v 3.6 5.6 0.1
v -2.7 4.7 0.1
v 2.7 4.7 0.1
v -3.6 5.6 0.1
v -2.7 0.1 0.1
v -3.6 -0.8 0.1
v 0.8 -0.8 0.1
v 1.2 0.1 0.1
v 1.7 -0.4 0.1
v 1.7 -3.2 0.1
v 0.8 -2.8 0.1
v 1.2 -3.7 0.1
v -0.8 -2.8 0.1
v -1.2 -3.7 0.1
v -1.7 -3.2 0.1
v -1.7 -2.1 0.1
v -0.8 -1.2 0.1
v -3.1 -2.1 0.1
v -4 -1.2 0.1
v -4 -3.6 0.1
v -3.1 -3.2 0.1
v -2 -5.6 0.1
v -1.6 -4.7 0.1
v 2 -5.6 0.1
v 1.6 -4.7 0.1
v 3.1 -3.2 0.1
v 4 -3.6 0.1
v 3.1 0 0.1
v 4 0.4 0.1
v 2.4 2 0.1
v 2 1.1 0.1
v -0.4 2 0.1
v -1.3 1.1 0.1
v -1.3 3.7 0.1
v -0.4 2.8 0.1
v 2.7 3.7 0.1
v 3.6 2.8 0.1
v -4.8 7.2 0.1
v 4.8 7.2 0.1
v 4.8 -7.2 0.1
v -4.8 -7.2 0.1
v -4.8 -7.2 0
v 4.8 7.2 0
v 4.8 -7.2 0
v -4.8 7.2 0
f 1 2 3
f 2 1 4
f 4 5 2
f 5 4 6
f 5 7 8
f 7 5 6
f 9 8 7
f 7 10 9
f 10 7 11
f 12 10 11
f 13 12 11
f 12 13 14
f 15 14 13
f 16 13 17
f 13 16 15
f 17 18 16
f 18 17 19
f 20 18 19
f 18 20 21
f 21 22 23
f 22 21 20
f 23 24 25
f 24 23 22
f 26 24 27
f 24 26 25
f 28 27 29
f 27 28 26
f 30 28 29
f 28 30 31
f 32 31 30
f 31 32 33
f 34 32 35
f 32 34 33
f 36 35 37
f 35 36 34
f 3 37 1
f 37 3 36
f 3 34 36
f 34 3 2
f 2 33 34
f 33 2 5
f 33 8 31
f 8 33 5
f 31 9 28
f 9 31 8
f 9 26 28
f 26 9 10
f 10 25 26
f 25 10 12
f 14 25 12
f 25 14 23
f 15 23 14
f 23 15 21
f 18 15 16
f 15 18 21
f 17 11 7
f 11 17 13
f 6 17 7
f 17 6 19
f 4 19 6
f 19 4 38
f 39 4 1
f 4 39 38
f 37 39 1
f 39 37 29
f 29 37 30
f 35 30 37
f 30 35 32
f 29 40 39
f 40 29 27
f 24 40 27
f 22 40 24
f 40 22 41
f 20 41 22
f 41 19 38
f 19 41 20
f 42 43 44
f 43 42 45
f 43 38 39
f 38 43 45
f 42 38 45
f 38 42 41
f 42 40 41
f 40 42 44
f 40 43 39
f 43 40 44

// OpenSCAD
// file: ../p/4-4edge.scad
use <../lib.scad>
$fa=1; $fs=0.2;
function ldraw_lib__4_4edge(realsolid=false) = [
// 0 Circle 1.0
// 0 Name: 4-4edge.dat
// 0 Author: James Jessiman
// 0 !LDRAW_ORG Primitive UPDATE 2017-01
// 0 !LICENSE Licensed under CC BY 2.0 and CC BY 4.0 : see CAreadme.txt
// 
// 0 BFC CERTIFY CCW
  [0,"BFC","CERTIFY"],
  [0,"BFC","CCW"],
// 
// 0 !HISTORY 1998-12-15 [PTadmin] Official Update 1998-10
// 0 !HISTORY 2005-12-28 [PTadmin] Official Update 2005-01
// 0 !HISTORY 2007-06-24 [PTadmin] Header formatted for Contributor Agreement
// 0 !HISTORY 2008-07-01 [PTadmin] Official Update 2008-01
// 0 !HISTORY 2017-01-15 [Steffen] BFCed
// 0 !HISTORY 2017-12-30 [PTadmin] Official Update 2017-01
// 
// 
// 2 24 1 0 0 0.9239 0 0.3827
  [2,24,1,0,0,0.9239,0,0.3827],
// 2 24 0.9239 0 0.3827 0.7071 0 0.7071
  [2,24,0.9239,0,0.3827,0.7071,0,0.7071],
// 2 24 0.7071 0 0.7071 0.3827 0 0.9239
  [2,24,0.7071,0,0.7071,0.3827,0,0.9239],
// 2 24 0.3827 0 0.9239 0 0 1
  [2,24,0.3827,0,0.9239,0,0,1],
// 2 24 0 0 1 -0.3827 0 0.9239
  [2,24,0,0,1,-0.3827,0,0.9239],
// 2 24 -0.3827 0 0.9239 -0.7071 0 0.7071
  [2,24,-0.3827,0,0.9239,-0.7071,0,0.7071],
// 2 24 -0.7071 0 0.7071 -0.9239 0 0.3827
  [2,24,-0.7071,0,0.7071,-0.9239,0,0.3827],
// 2 24 -0.9239 0 0.3827 -1 0 -0
  [2,24,-0.9239,0,0.3827,-1,0,-0],
// 2 24 -1 0 -0 -0.9239 0 -0.3827
  [2,24,-1,0,-0,-0.9239,0,-0.3827],
// 2 24 -0.9239 0 -0.3827 -0.7071 0 -0.7071
  [2,24,-0.9239,0,-0.3827,-0.7071,0,-0.7071],
// 2 24 -0.7071 0 -0.7071 -0.3827 0 -0.9239
  [2,24,-0.7071,0,-0.7071,-0.3827,0,-0.9239],
// 2 24 -0.3827 0 -0.9239 0 0 -1
  [2,24,-0.3827,0,-0.9239,0,0,-1],
// 2 24 0 0 -1 0.3827 0 -0.9239
  [2,24,0,0,-1,0.3827,0,-0.9239],
// 2 24 0.3827 0 -0.9239 0.7071 0 -0.7071
  [2,24,0.3827,0,-0.9239,0.7071,0,-0.7071],
// 2 24 0.7071 0 -0.7071 0.9239 0 -0.3827
  [2,24,0.7071,0,-0.7071,0.9239,0,-0.3827],
// 2 24 0.9239 0 -0.3827 1 0 0
  [2,24,0.9239,0,-0.3827,1,0,0],
];
module ldraw_lib__4_4edge(step=0, col=false, unit=2/5, alt=false, line=0.2, solid=!$preview)
    makepoly(ldraw_lib__4_4edge(solid), step=step, col=col, unit=unit, alt=alt, line=line, solid=solid);
ldraw_lib__4_4edge(line=0.2);
// file: ../p/4-4disc.scad
use <../lib.scad>
$fa=1; $fs=0.2;
function ldraw_lib__4_4disc(realsolid=false) = [
// 0 Disc 1.0
// 0 Name: 4-4disc.dat
// 0 Author: James Jessiman
// 0 !LDRAW_ORG Primitive UPDATE 2002-02
// 0 !LICENSE Licensed under CC BY 2.0 and CC BY 4.0 : see CAreadme.txt
// 
// 0 BFC CERTIFY CCW
  [0,"BFC","CERTIFY"],
  [0,"BFC","CCW"],
// 
// 0 !HISTORY 1998-12-15 [PTadmin] Official Update 1998-10
// 0 !HISTORY 2002-03-23 [sbliss] Added BFC statement
// 0 !HISTORY 2002-04-25 [PTadmin] Official Update 2002-02
// 0 !HISTORY 2007-06-24 [PTadmin] Header formatted for Contributor Agreement
// 0 !HISTORY 2008-07-01 [PTadmin] Official Update 2008-01
// 
// 
// 3 16 0 0 0 1 0 0 0.9239 0 0.3827
  [3,16,0,0,0,1,0,0,0.9239,0,0.3827],
// 3 16 0 0 0 0.9239 0 0.3827 0.7071 0 0.7071
  [3,16,0,0,0,0.9239,0,0.3827,0.7071,0,0.7071],
// 3 16 0 0 0 0.7071 0 0.7071 0.3827 0 0.9239
  [3,16,0,0,0,0.7071,0,0.7071,0.3827,0,0.9239],
// 3 16 0 0 0 0.3827 0 0.9239 0 0 1
  [3,16,0,0,0,0.3827,0,0.9239,0,0,1],
// 3 16 0 0 0 0 0 1 -0.3827 0 0.9239
  [3,16,0,0,0,0,0,1,-0.3827,0,0.9239],
// 3 16 0 0 0 -0.3827 0 0.9239 -0.7071 0 0.7071
  [3,16,0,0,0,-0.3827,0,0.9239,-0.7071,0,0.7071],
// 3 16 0 0 0 -0.7071 0 0.7071 -0.9239 0 0.3827
  [3,16,0,0,0,-0.7071,0,0.7071,-0.9239,0,0.3827],
// 3 16 0 0 0 -0.9239 0 0.3827 -1 0 -0
  [3,16,0,0,0,-0.9239,0,0.3827,-1,0,-0],
// 3 16 0 0 0 -1 0 -0 -0.9239 0 -0.3827
  [3,16,0,0,0,-1,0,-0,-0.9239,0,-0.3827],
// 3 16 0 0 0 -0.9239 0 -0.3827 -0.7071 0 -0.7071
  [3,16,0,0,0,-0.9239,0,-0.3827,-0.7071,0,-0.7071],
// 3 16 0 0 0 -0.7071 0 -0.7071 -0.3827 0 -0.9239
  [3,16,0,0,0,-0.7071,0,-0.7071,-0.3827,0,-0.9239],
// 3 16 0 0 0 -0.3827 0 -0.9239 0 0 -1
  [3,16,0,0,0,-0.3827,0,-0.9239,0,0,-1],
// 3 16 0 0 0 0 0 -1 0.3827 0 -0.9239
  [3,16,0,0,0,0,0,-1,0.3827,0,-0.9239],
// 3 16 0 0 0 0.3827 0 -0.9239 0.7071 0 -0.7071
  [3,16,0,0,0,0.3827,0,-0.9239,0.7071,0,-0.7071],
// 3 16 0 0 0 0.7071 0 -0.7071 0.9239 0 -0.3827
  [3,16,0,0,0,0.7071,0,-0.7071,0.9239,0,-0.3827],
// 3 16 0 0 0 0.9239 0 -0.3827 1 0 0
  [3,16,0,0,0,0.9239,0,-0.3827,1,0,0],
// 0
];
module ldraw_lib__4_4disc(step=0, col=false, unit=2/5, alt=false, line=0.2, solid=!$preview)
    makepoly(ldraw_lib__4_4disc(solid), step=step, col=col, unit=unit, alt=alt, line=line, solid=solid);
ldraw_lib__4_4disc(line=0.2);
// file: ../p/4-4cyli.scad
use <../lib.scad>
$fa=1; $fs=0.2;
function ldraw_lib__4_4cyli(realsolid=false) = [
// 0 Cylinder 1.0
// 0 Name: 4-4cyli.dat
// 0 Author: James Jessiman
// 0 !LDRAW_ORG Primitive UPDATE 2005-01
// 0 !LICENSE Licensed under CC BY 2.0 and CC BY 4.0 : see CAreadme.txt
// 
// 0 BFC CERTIFY CCW
  [0,"BFC","CERTIFY"],
  [0,"BFC","CCW"],
// 
// 0 !HISTORY 1998-12-15 [PTadmin] Official Update 1998-10
// 0 !HISTORY 2002-03-23 [sbliss] Added BFC statement; merged headers from files in distributions LDraw 0.27 and Complete.
// 0 !HISTORY 2002-04-25 [PTadmin] Official Update 2002-02
// 0 !HISTORY 2004-12-14 [guyvivan] BFC CCW
// 0 !HISTORY 2005-12-28 [PTadmin] Official Update 2005-01
// 0 !HISTORY 2007-06-24 [PTadmin] Header formatted for Contributor Agreement
// 0 !HISTORY 2008-07-01 [PTadmin] Official Update 2008-01
// 
// 
// 4 16 1 1 0 0.9239 1 0.3827 0.9239 0 0.3827 1 0 0
  [4,16,1,1,0,0.9239,1,0.3827,0.9239,0,0.3827,1,0,0],
// 5 24 1 0 0 1 1 0 0.9239 0 0.3827 0.9239 0 -0.3827
  [5,24,1,0,0,1,1,0,0.9239,0,0.3827,0.9239,0,-0.3827],
// 4 16 0.9239 1 0.3827 0.7071 1 0.7071 0.7071 0 0.7071 0.9239 0 0.3827
  [4,16,0.9239,1,0.3827,0.7071,1,0.7071,0.7071,0,0.7071,0.9239,0,0.3827],
// 5 24 0.9239 0 0.3827 0.9239 1 0.3827 0.7071 0 0.7071 1 0 0
  [5,24,0.9239,0,0.3827,0.9239,1,0.3827,0.7071,0,0.7071,1,0,0],
// 4 16 0.7071 1 0.7071 0.3827 1 0.9239 0.3827 0 0.9239 0.7071 0 0.7071
  [4,16,0.7071,1,0.7071,0.3827,1,0.9239,0.3827,0,0.9239,0.7071,0,0.7071],
// 5 24 0.7071 0 0.7071 0.7071 1 0.7071 0.3827 0 0.9239 0.9239 0 0.3827
  [5,24,0.7071,0,0.7071,0.7071,1,0.7071,0.3827,0,0.9239,0.9239,0,0.3827],
// 4 16 0.3827 1 0.9239 0 1 1 0 0 1 0.3827 0 0.9239
  [4,16,0.3827,1,0.9239,0,1,1,0,0,1,0.3827,0,0.9239],
// 5 24 0.3827 0 0.9239 0.3827 1 0.9239 0 0 1 0.7071 0 0.7071
  [5,24,0.3827,0,0.9239,0.3827,1,0.9239,0,0,1,0.7071,0,0.7071],
// 4 16 0 1 1 -0.3827 1 0.9239 -0.3827 0 0.9239 0 0 1
  [4,16,0,1,1,-0.3827,1,0.9239,-0.3827,0,0.9239,0,0,1],
// 5 24 0 0 1 0 1 1 -0.3827 0 0.9239 0.3827 0 0.9239
  [5,24,0,0,1,0,1,1,-0.3827,0,0.9239,0.3827,0,0.9239],
// 4 16 -0.3827 1 0.9239 -0.7071 1 0.7071 -0.7071 0 0.7071 -0.3827 0 0.9239
  [4,16,-0.3827,1,0.9239,-0.7071,1,0.7071,-0.7071,0,0.7071,-0.3827,0,0.9239],
// 5 24 -0.3827 0 0.9239 -0.3827 1 0.9239 -0.7071 0 0.7071 0 0 1
  [5,24,-0.3827,0,0.9239,-0.3827,1,0.9239,-0.7071,0,0.7071,0,0,1],
// 4 16 -0.7071 1 0.7071 -0.9239 1 0.3827 -0.9239 0 0.3827 -0.7071 0 0.7071
  [4,16,-0.7071,1,0.7071,-0.9239,1,0.3827,-0.9239,0,0.3827,-0.7071,0,0.7071],
// 5 24 -0.7071 0 0.7071 -0.7071 1 0.7071 -0.9239 0 0.3827 -0.3827 0 0.9239
  [5,24,-0.7071,0,0.7071,-0.7071,1,0.7071,-0.9239,0,0.3827,-0.3827,0,0.9239],
// 4 16 -0.9239 1 0.3827 -1 1 0 -1 0 0 -0.9239 0 0.3827
  [4,16,-0.9239,1,0.3827,-1,1,0,-1,0,0,-0.9239,0,0.3827],
// 5 24 -0.9239 0 0.3827 -0.9239 1 0.3827 -1 0 0 -0.7071 0 0.7071
  [5,24,-0.9239,0,0.3827,-0.9239,1,0.3827,-1,0,0,-0.7071,0,0.7071],
// 4 16 -1 1 0 -0.9239 1 -0.3827 -0.9239 0 -0.3827 -1 0 0
  [4,16,-1,1,0,-0.9239,1,-0.3827,-0.9239,0,-0.3827,-1,0,0],
// 5 24 -1 0 0 -1 1 0 -0.9239 0 -0.3827 -0.9239 0 0.3827
  [5,24,-1,0,0,-1,1,0,-0.9239,0,-0.3827,-0.9239,0,0.3827],
// 4 16 -0.9239 1 -0.3827 -0.7071 1 -0.7071 -0.7071 0 -0.7071 -0.9239 0 -0.3827
  [4,16,-0.9239,1,-0.3827,-0.7071,1,-0.7071,-0.7071,0,-0.7071,-0.9239,0,-0.3827],
// 5 24 -0.9239 0 -0.3827 -0.9239 1 -0.3827 -0.7071 0 -0.7071 -1 0 0
  [5,24,-0.9239,0,-0.3827,-0.9239,1,-0.3827,-0.7071,0,-0.7071,-1,0,0],
// 4 16 -0.7071 1 -0.7071 -0.3827 1 -0.9239 -0.3827 0 -0.9239 -0.7071 0 -0.7071
  [4,16,-0.7071,1,-0.7071,-0.3827,1,-0.9239,-0.3827,0,-0.9239,-0.7071,0,-0.7071],
// 5 24 -0.7071 0 -0.7071 -0.7071 1 -0.7071 -0.3827 0 -0.9239 -0.9239 0 -0.3827
  [5,24,-0.7071,0,-0.7071,-0.7071,1,-0.7071,-0.3827,0,-0.9239,-0.9239,0,-0.3827],
// 4 16 -0.3827 1 -0.9239 0 1 -1 0 0 -1 -0.3827 0 -0.9239
  [4,16,-0.3827,1,-0.9239,0,1,-1,0,0,-1,-0.3827,0,-0.9239],
// 5 24 -0.3827 0 -0.9239 -0.3827 1 -0.9239 0 0 -1 -0.7071 0 -0.7071
  [5,24,-0.3827,0,-0.9239,-0.3827,1,-0.9239,0,0,-1,-0.7071,0,-0.7071],
// 4 16 0 1 -1 0.3827 1 -0.9239 0.3827 0 -0.9239 0 0 -1
  [4,16,0,1,-1,0.3827,1,-0.9239,0.3827,0,-0.9239,0,0,-1],
// 5 24 0 0 -1 0 1 -1 0.3827 0 -0.9239 -0.3827 0 -0.9239
  [5,24,0,0,-1,0,1,-1,0.3827,0,-0.9239,-0.3827,0,-0.9239],
// 4 16 0.3827 1 -0.9239 0.7071 1 -0.7071 0.7071 0 -0.7071 0.3827 0 -0.9239
  [4,16,0.3827,1,-0.9239,0.7071,1,-0.7071,0.7071,0,-0.7071,0.3827,0,-0.9239],
// 5 24 0.3827 0 -0.9239 0.3827 1 -0.9239 0.7071 0 -0.7071 0 0 -1
  [5,24,0.3827,0,-0.9239,0.3827,1,-0.9239,0.7071,0,-0.7071,0,0,-1],
// 4 16 0.7071 1 -0.7071 0.9239 1 -0.3827 0.9239 0 -0.3827 0.7071 0 -0.7071
  [4,16,0.7071,1,-0.7071,0.9239,1,-0.3827,0.9239,0,-0.3827,0.7071,0,-0.7071],
// 5 24 0.7071 0 -0.7071 0.7071 1 -0.7071 0.9239 0 -0.3827 0.3827 0 -0.9239
  [5,24,0.7071,0,-0.7071,0.7071,1,-0.7071,0.9239,0,-0.3827,0.3827,0,-0.9239],
// 4 16 0.9239 1 -0.3827 1 1 0 1 0 0 0.9239 0 -0.3827
  [4,16,0.9239,1,-0.3827,1,1,0,1,0,0,0.9239,0,-0.3827],
// 5 24 0.9239 0 -0.3827 0.9239 1 -0.3827 1 0 0 0.7071 0 -0.7071
  [5,24,0.9239,0,-0.3827,0.9239,1,-0.3827,1,0,0,0.7071,0,-0.7071],
// 0
];
module ldraw_lib__4_4cyli(step=0, col=false, unit=2/5, alt=false, line=0.2, solid=!$preview)
    makepoly(ldraw_lib__4_4cyli(solid), step=step, col=col, unit=unit, alt=alt, line=line, solid=solid);
ldraw_lib__4_4cyli(line=0.2);
// file: ../p/stud3.scad
use <../lib.scad>
use <4-4cyli.scad>
use <4-4disc.scad>
use <4-4edge.scad>
$fa=1; $fs=0.2;
function ldraw_lib__stud3(realsolid=false) = realsolid ? 
    [openscad(translate([0,0,-eps()], o=cylinder(4+eps(), r=4)),2)] : [
// 0 Stud Tube Solid
// 0 Name: stud3.dat
// 0 Author: James Jessiman
// 0 !LDRAW_ORG Primitive UPDATE 2012-01
// 0 !LICENSE Licensed under CC BY 2.0 and CC BY 4.0 : see CAreadme.txt
// 
// 0 BFC CERTIFY CCW
  [0,"BFC","CERTIFY"],
  [0,"BFC","CCW"],
// 
// 0 !HISTORY 2002-04-04 [sbliss] Modified for BFC compliance
// 0 !HISTORY 2002-04-25 [PTadmin] Official Update 2002-02
// 0 !HISTORY 2007-06-24 [PTadmin] Header formatted for Contributor Agreement
// 0 !HISTORY 2008-07-01 [PTadmin] Official Update 2008-01
// 0 !HISTORY 2012-02-16 [Philo] Changed to CCW
// 0 !HISTORY 2012-03-30 [PTadmin] Official Update 2012-01
// 
// 
// 1 16 0 -4 0 4 0 0 0 1 0 0 0 4 4-4edge.dat
  [1,16,0,-4,0,4,0,0,0,1,0,0,0,4, ldraw_lib__4_4edge(realsolid)],
// 1 16 0 0 0 4 0 0 0 1 0 0 0 4 4-4edge.dat
  [1,16,0,0,0,4,0,0,0,1,0,0,0,4, ldraw_lib__4_4edge(realsolid)],
// 1 16 0 -4 0 4 0 0 0 1 0 0 0 4 4-4disc.dat
  [1,16,0,-4,0,4,0,0,0,1,0,0,0,4, ldraw_lib__4_4disc(realsolid)],
// 1 16 0 -4 0 4 0 0 0 4 0 0 0 4 4-4cyli.dat
  [1,16,0,-4,0,4,0,0,0,4,0,0,0,4, ldraw_lib__4_4cyli(realsolid)],
];
module ldraw_lib__stud3(step=0, col=false, unit=2/5, alt=false, line=0.2, solid=!$preview)
    makepoly(ldraw_lib__stud3(solid), step=step, col=col, unit=unit, alt=alt, line=line, solid=solid);
ldraw_lib__stud3(line=0.2);
// file: ../p/stud.scad
use <../lib.scad>
use <4-4cyli.scad>
use <4-4disc.scad>
use <4-4edge.scad>
$fa=1; $fs=0.2;
function ldraw_lib__stud(realsolid=false) = realsolid ? 
    [openscad(translate([0,0,-eps()], o=cylinder(4+eps(), r=6)),2)] : [
// 0 Stud
// 0 Name: stud.dat
// 0 Author: James Jessiman
// 0 !LDRAW_ORG Primitive UPDATE 2012-01
// 0 !LICENSE Licensed under CC BY 2.0 and CC BY 4.0 : see CAreadme.txt
// 
// 0 BFC CERTIFY CCW
  [0,"BFC","CERTIFY"],
  [0,"BFC","CCW"],
// 
// 0 !HISTORY 2002-04-04 [sbliss] Modified for BFC compliance
// 0 !HISTORY 2002-04-25 [PTadmin] Official Update 2002-02
// 0 !HISTORY 2007-06-24 [PTadmin] Header formatted for Contributor Agreement
// 0 !HISTORY 2008-07-01 [PTadmin] Official Update 2008-01
// 0 !HISTORY 2012-02-16 [Philo] Changed to CCW
// 0 !HISTORY 2012-03-30 [PTadmin] Official Update 2012-01
// 
// 
// 1 16 0 0 0 6 0 0 0 1 0 0 0 6 4-4edge.dat
  [1,16,0,0,0,6,0,0,0,1,0,0,0,6, ldraw_lib__4_4edge(realsolid)],
// 1 16 0 -4 0 6 0 0 0 1 0 0 0 6 4-4edge.dat
  [1,16,0,-4,0,6,0,0,0,1,0,0,0,6, ldraw_lib__4_4edge(realsolid)],
// 1 16 0 0 0 6 0 0 0 -4 0 0 0 6 4-4cyli.dat
  [1,16,0,0,0,6,0,0,0,-4,0,0,0,6, ldraw_lib__4_4cyli(realsolid)],
// 1 16 0 -4 0 6 0 0 0 1 0 0 0 6 4-4disc.dat
  [1,16,0,-4,0,6,0,0,0,1,0,0,0,6, ldraw_lib__4_4disc(realsolid)],
];
module ldraw_lib__stud(step=0, col=false, unit=2/5, alt=false, line=0.2, solid=!$preview)
    makepoly(ldraw_lib__stud(solid), step=step, col=col, unit=unit, alt=alt, line=line, solid=solid);
ldraw_lib__stud(line=0.2);
// file: ../p/box5.scad
use <../lib.scad>
$fa=1; $fs=0.2;
function ldraw_lib__box5(realsolid=false) = [
// 0 Box with 5 Faces and All Edges
// 0 Name: box5.dat
// 0 Author: James Jessiman
// 0 !LDRAW_ORG Primitive UPDATE 2012-01
// 0 !LICENSE Licensed under CC BY 2.0 and CC BY 4.0 : see CAreadme.txt
// 
// 0 BFC CERTIFY CCW
  [0,"BFC","CERTIFY"],
  [0,"BFC","CCW"],
// 
// 0 !HISTORY 2002-04-03 [sbliss] Modified for BFC compliance
// 0 !HISTORY 2002-04-25 [PTadmin] Official Update 2002-02
// 0 !HISTORY 2007-06-24 [PTadmin] Header formatted for Contributor Agreement
// 0 !HISTORY 2008-07-01 [PTadmin] Official Update 2008-01
// 0 !HISTORY 2012-02-16 [Philo] Changed to CCW
// 0 !HISTORY 2012-03-30 [PTadmin] Official Update 2012-01
// 
// 
// 2 24 1 1 1 -1 1 1
  [2,24,1,1,1,-1,1,1],
// 2 24 -1 1 1 -1 1 -1
  [2,24,-1,1,1,-1,1,-1],
// 2 24 -1 1 -1 1 1 -1
  [2,24,-1,1,-1,1,1,-1],
// 2 24 1 1 -1 1 1 1
  [2,24,1,1,-1,1,1,1],
// 2 24 1 0 1 -1 0 1
  [2,24,1,0,1,-1,0,1],
// 2 24 -1 0 1 -1 0 -1
  [2,24,-1,0,1,-1,0,-1],
// 2 24 -1 0 -1 1 0 -1
  [2,24,-1,0,-1,1,0,-1],
// 2 24 1 0 -1 1 0 1
  [2,24,1,0,-1,1,0,1],
// 2 24 1 0 1 1 1 1
  [2,24,1,0,1,1,1,1],
// 2 24 -1 0 1 -1 1 1
  [2,24,-1,0,1,-1,1,1],
// 2 24 1 0 -1 1 1 -1
  [2,24,1,0,-1,1,1,-1],
// 2 24 -1 0 -1 -1 1 -1
  [2,24,-1,0,-1,-1,1,-1],
// 4 16 -1 1 1 1 1 1 1 1 -1 -1 1 -1
  [4,16,-1,1,1,1,1,1,1,1,-1,-1,1,-1],
// 4 16 -1 1 1 -1 0 1 1 0 1 1 1 1
  [4,16,-1,1,1,-1,0,1,1,0,1,1,1,1],
// 4 16 -1 1 -1 -1 0 -1 -1 0 1 -1 1 1
  [4,16,-1,1,-1,-1,0,-1,-1,0,1,-1,1,1],
// 4 16 1 1 -1 1 0 -1 -1 0 -1 -1 1 -1
  [4,16,1,1,-1,1,0,-1,-1,0,-1,-1,1,-1],
// 4 16 1 1 1 1 0 1 1 0 -1 1 1 -1
  [4,16,1,1,1,1,0,1,1,0,-1,1,1,-1],
];
module ldraw_lib__box5(step=0, col=false, unit=2/5, alt=false, line=0.2, solid=!$preview)
    makepoly(ldraw_lib__box5(solid), step=step, col=col, unit=unit, alt=alt, line=line, solid=solid);
ldraw_lib__box5(line=0.2);
// file: ../p/box4t.scad
use <../lib.scad>
$fa=1; $fs=0.2;
function ldraw_lib__box4t(realsolid=false) = [
// 0 Box with 4 Adjacent Faces and All Edges
// 0 Name: box4t.dat
// 0 Author: Tore Eriksson [Tore_Eriksson]
// 0 !LDRAW_ORG Primitive UPDATE 2003-02
// 0 !LICENSE Licensed under CC BY 2.0 and CC BY 4.0 : see CAreadme.txt
// 
// 0 BFC CERTIFY CCW
  [0,"BFC","CERTIFY"],
  [0,"BFC","CCW"],
// 
// 0 !HISTORY 1997-09-29 [PTadmin] Official Update 1997-15
// 0 !HISTORY 2002-08-31 [izanette] Modified with WINDZ for BFC compliance
// 0 !HISTORY 2003-08-01 [PTadmin] Official Update 2003-02
// 0 !HISTORY 2007-06-24 [PTadmin] Header formatted for Contributor Agreement
// 0 !HISTORY 2008-07-01 [PTadmin] Official Update 2008-01
// 
// 
// 2 24 1 1 1 -1 1 1
  [2,24,1,1,1,-1,1,1],
// 2 24 -1 1 1 -1 1 -1
  [2,24,-1,1,1,-1,1,-1],
// 2 24 -1 1 -1 1 1 -1
  [2,24,-1,1,-1,1,1,-1],
// 2 24 1 1 -1 1 1 1
  [2,24,1,1,-1,1,1,1],
// 2 24 1 0 1 -1 0 1
  [2,24,1,0,1,-1,0,1],
// 2 24 -1 0 1 -1 0 -1
  [2,24,-1,0,1,-1,0,-1],
// 2 24 -1 0 -1 1 0 -1
  [2,24,-1,0,-1,1,0,-1],
// 2 24 1 0 -1 1 0 1
  [2,24,1,0,-1,1,0,1],
// 2 24 1 0 1 1 1 1
  [2,24,1,0,1,1,1,1],
// 2 24 -1 0 1 -1 1 1
  [2,24,-1,0,1,-1,1,1],
// 2 24 1 0 -1 1 1 -1
  [2,24,1,0,-1,1,1,-1],
// 2 24 -1 0 -1 -1 1 -1
  [2,24,-1,0,-1,-1,1,-1],
// 4 16 1 1 1 1 1 -1 -1 1 -1 -1 1 1
  [4,16,1,1,1,1,1,-1,-1,1,-1,-1,1,1],
// 4 16 1 1 1 -1 1 1 -1 0 1 1 0 1
  [4,16,1,1,1,-1,1,1,-1,0,1,1,0,1],
// 4 16 -1 1 1 -1 1 -1 -1 0 -1 -1 0 1
  [4,16,-1,1,1,-1,1,-1,-1,0,-1,-1,0,1],
// 0 4 16 -1 1 -1 -1 0 -1 1 0 -1 1 1 -1
// 4 16 1 1 -1 1 1 1 1 0 1 1 0 -1
  [4,16,1,1,-1,1,1,1,1,0,1,1,0,-1],
// 0
];
module ldraw_lib__box4t(step=0, col=false, unit=2/5, alt=false, line=0.2, solid=!$preview)
    makepoly(ldraw_lib__box4t(solid), step=step, col=col, unit=unit, alt=alt, line=line, solid=solid);
ldraw_lib__box4t(line=0.2);
// file: s/3004s01.scad
use <../../lib.scad>
use <../../p/box4t.scad>
use <../../p/box5.scad>
use <../../p/stud.scad>
use <../../p/stud3.scad>
$fa=1; $fs=0.2;
function ldraw_lib__s__3004s01(realsolid=false) = [
// 0 ~Brick  1 x  2 without Front Face
// 0 Name: s\3004s01.dat
// 0 Author: James Jessiman
// 0 !LDRAW_ORG Subpart UPDATE 2003-03
// 0 !LICENSE Licensed under CC BY 2.0 and CC BY 4.0 : see CAreadme.txt
// 
// 0 BFC CERTIFY CCW
  [0,"BFC","CERTIFY"],
  [0,"BFC","CCW"],
// 
// 0 !HISTORY 2003-09-07 [jriley] Subfiling, BFC
// 0 !HISTORY 2003-12-19 [PTadmin] Official Update 2003-03
// 0 !HISTORY 2007-08-29 [PTadmin] Header formatted for Contributor Agreement
// 0 !HISTORY 2008-07-01 [PTadmin] Official Update 2008-01
// 
// 
// 1 16 0 4 0 1 0 0 0 -5 0 0 0 1 stud3.dat
  [1,16,0,4,0,1,0,0,0,-5,0,0,0,1, ldraw_lib__stud3(realsolid)],
// 0 BFC INVERTNEXT
  [0,"BFC","INVERTNEXT"],
// 1 16 0 24 0 16 0 0 0 -20 0 0 0 6 box5.dat
  [1,16,0,24,0,16,0,0,0,-20,0,0,0,6, ldraw_lib__box5(realsolid)],
// 4 16 20 24 10 16 24 6 -16 24 6 -20 24 10
  [4,16,20,24,10,16,24,6,-16,24,6,-20,24,10],
// 4 16 -20 24 10 -16 24 6 -16 24 -6 -20 24 -10
  [4,16,-20,24,10,-16,24,6,-16,24,-6,-20,24,-10],
// 4 16 -20 24 -10 -16 24 -6 16 24 -6 20 24 -10
  [4,16,-20,24,-10,-16,24,-6,16,24,-6,20,24,-10],
// 4 16 20 24 -10 16 24 -6 16 24 6 20 24 10
  [4,16,20,24,-10,16,24,-6,16,24,6,20,24,10],
// 1 16 0 24 0 20 0 0 0 -24 0 0 0 10 box4t.dat
  [1,16,0,24,0,20,0,0,0,-24,0,0,0,10, ldraw_lib__box4t(realsolid)],
// 1 16 10 0 0 1 0 0 0 1 0 0 0 1 stud.dat
  [1,16,10,0,0,1,0,0,0,1,0,0,0,1, ldraw_lib__stud(realsolid)],
// 1 16 -10 0 0 1 0 0 0 1 0 0 0 1 stud.dat
  [1,16,-10,0,0,1,0,0,0,1,0,0,0,1, ldraw_lib__stud(realsolid)],
// 0
];
module ldraw_lib__s__3004s01(step=0, col=false, unit=2/5, alt=false, line=0.2, solid=!$preview)
    makepoly(ldraw_lib__s__3004s01(solid), step=step, col=col, unit=unit, alt=alt, line=line, solid=solid);
ldraw_lib__s__3004s01(line=0.2);
// file: 3004.scad
use <../lib.scad>
use <s/3004s01.scad>
$fa=1; $fs=0.2;
function ldraw_lib__3004(realsolid=false) = [
// 0 Brick  1 x  2
// 0 Name: 3004.dat
// 0 Author: James Jessiman
// 0 !LDRAW_ORG Part UPDATE 2022-05
// 0 !LICENSE Licensed under CC BY 2.0 and CC BY 4.0 : see CAreadme.txt
// 
// 0 BFC CERTIFY CCW
  [0,"BFC","CERTIFY"],
  [0,"BFC","CCW"],
// 
// 0 !HISTORY 2001-10-26 [PTadmin] Official Update 2001-01
// 0 !HISTORY 2002-05-07 {unknown} BFC Certification
// 0 !HISTORY 2002-06-11 [PTadmin] Official Update 2002-03
// 0 !HISTORY 2007-05-07 [PTadmin] Header formatted for Contributor Agreement
// 0 !HISTORY 2008-07-01 [PTadmin] Official Update 2008-01
// 0 !HISTORY 2022-08-04 [MagFors] Using subfile
// 0 !HISTORY 2022-09-15 [PTadmin] Official Update 2022-05
// 
// 
// 1 16 0 0 0 1 0 0 0 1 0 0 0 1 s\3004s01.dat
  [1,16,0,0,0,1,0,0,0,1,0,0,0,1, ldraw_lib__s__3004s01(realsolid)],
// 4 16 -20 24 -10 20 24 -10 20 0 -10 -20 0 -10
  [4,16,-20,24,-10,20,24,-10,20,0,-10,-20,0,-10],
];
module ldraw_lib__3004(step=0, col=false, unit=2/5, alt=false, line=0.2, solid=!$preview)
    makepoly(ldraw_lib__3004(solid), step=step, col=col, unit=unit, alt=alt, line=line, solid=solid);
ldraw_lib__3004(line=0.2);
// file: ../p/box5-12.scad
use <../lib.scad>
$fa=1; $fs=0.2;
function ldraw_lib__box5_12(realsolid=false) = [
// 0 Box with 5 Faces without Any Edges
// 0 Name: box5-12.dat
// 0 Author: Chris Dee [cwdee]
// 0 !LDRAW_ORG Primitive UPDATE 2009-02
// 0 !LICENSE Licensed under CC BY 2.0 and CC BY 4.0 : see CAreadme.txt
// 
// 0 BFC CERTIFY CCW
  [0,"BFC","CERTIFY"],
  [0,"BFC","CCW"],
// 
// 0 !HISTORY 2009-09-03 [PTadmin] Official Update 2009-02
// 
// 
// 4 16 1 1 1 1 1 -1 -1 1 -1 -1 1 1
  [4,16,1,1,1,1,1,-1,-1,1,-1,-1,1,1],
// 4 16 -1 0 1 1 0 1 1 1 1 -1 1 1
  [4,16,-1,0,1,1,0,1,1,1,1,-1,1,1],
// 4 16 -1 0 -1 -1 0 1 -1 1 1 -1 1 -1
  [4,16,-1,0,-1,-1,0,1,-1,1,1,-1,1,-1],
// 4 16 1 0 -1 -1 0 -1 -1 1 -1 1 1 -1
  [4,16,1,0,-1,-1,0,-1,-1,1,-1,1,1,-1],
// 4 16 1 0 1 1 0 -1 1 1 -1 1 1 1
  [4,16,1,0,1,1,0,-1,1,1,-1,1,1,1],
// 0
];
module ldraw_lib__box5_12(step=0, col=false, unit=2/5, alt=false, line=0.2, solid=!$preview)
    makepoly(ldraw_lib__box5_12(solid), step=step, col=col, unit=unit, alt=alt, line=line, solid=solid);
ldraw_lib__box5_12(line=0.2);
// main file
use <../lib.scad>
use <../p/box5-12.scad>
$fa=1; $fs=0.2;
function ldraw_lib__820675a(realsolid=false) = [
// 0 Sticker  1.8 x  1.2 with Yellow Outline "5"
// 0 Name: 820675a.dat
// 0 Author: Miklos Hosszu [hmick]
// 0 !LDRAW_ORG Part UPDATE 2014-01
// 0 !LICENSE Licensed under CC BY 2.0 and CC BY 4.0 : see CAreadme.txt
// 
// 0 BFC CERTIFY CW
  [0,"BFC","CERTIFY"],
  [0,"BFC","CW"],
// 
// 0 !KEYWORDS Dark Shark, Nautica, set 6679
// 
// 0 !HISTORY 2007-07-05 [Holly-Wood] Fixed color issue, new CA-header
// 0 !HISTORY 2011-08-20 [cwdee] Change background colour to 16
// 0 !HISTORY 2012-08-09 [PTadmin] Official Update 2012-02
// 0 !HISTORY 2014-01-23 [cwdee] Correct keywords
// 0 !HISTORY 2014-06-21 [PTadmin] Official Update 2014-01
// 
// 
// 0 // Yellow
// 
// 4 14 9 -0.25 14 6.75 -0.25 11.75 -6.75 -0.25 11.75 -9 -0.25 14
  [4,14,9,-0.25,14,6.75,-0.25,11.75,-6.75,-0.25,11.75,-9,-0.25,14],
// 4 14 -9 -0.25 14 -6.75 -0.25 11.75 -6.75 -0.25 0.25 -9 -0.25 -2
  [4,14,-9,-0.25,14,-6.75,-0.25,11.75,-6.75,-0.25,0.25,-9,-0.25,-2],
// 4 14 3 -0.25 0.25 2 -0.25 -2 -9 -0.25 -2 -6.75 -0.25 0.25
  [4,14,3,-0.25,0.25,2,-0.25,-2,-9,-0.25,-2,-6.75,-0.25,0.25],
// 3 14 2 -0.25 -2 3 -0.25 0.25 4.25 -0.25 -1
  [3,14,2,-0.25,-2,3,-0.25,0.25,4.25,-0.25,-1],
// 4 14 2 -0.25 -2 4.25 -0.25 -1 4.25 -0.25 -8 2 -0.25 -7
  [4,14,2,-0.25,-2,4.25,-0.25,-1,4.25,-0.25,-8,2,-0.25,-7],
// 3 14 2 -0.25 -7 4.25 -0.25 -8 3 -0.25 -9.25
  [3,14,2,-0.25,-7,4.25,-0.25,-8,3,-0.25,-9.25],
// 4 14 2 -0.25 -7 3 -0.25 -9.25 -3 -0.25 -9.25 -2 -0.25 -7
  [4,14,2,-0.25,-7,3,-0.25,-9.25,-3,-0.25,-9.25,-2,-0.25,-7],
// 3 14 -2 -0.25 -7 -3 -0.25 -9.25 -4.25 -0.25 -8
  [3,14,-2,-0.25,-7,-3,-0.25,-9.25,-4.25,-0.25,-8],
// 4 14 -2 -0.25 -7 -4.25 -0.25 -8 -4.25 -0.25 -5.25 -2 -0.25 -3
  [4,14,-2,-0.25,-7,-4.25,-0.25,-8,-4.25,-0.25,-5.25,-2,-0.25,-3],
// 4 14 -7.75 -0.25 -5.25 -10 -0.25 -3 -2 -0.25 -3 -4.25 -0.25 -5.25
  [4,14,-7.75,-0.25,-5.25,-10,-0.25,-3,-2,-0.25,-3,-4.25,-0.25,-5.25],
// 4 14 -10 -0.25 -3 -7.75 -0.25 -5.25 -7.75 -0.25 -8 -10 -0.25 -9
  [4,14,-10,-0.25,-3,-7.75,-0.25,-5.25,-7.75,-0.25,-8,-10,-0.25,-9],
// 4 14 -4 -0.25 -11.75 -5 -0.25 -14 -10 -0.25 -9 -7.75 -0.25 -8
  [4,14,-4,-0.25,-11.75,-5,-0.25,-14,-10,-0.25,-9,-7.75,-0.25,-8],
// 4 14 -5 -0.25 -14 -4 -0.25 -11.75 4 -0.25 -11.75 5 -0.25 -14
  [4,14,-5,-0.25,-14,-4,-0.25,-11.75,4,-0.25,-11.75,5,-0.25,-14],
// 4 14 7.75 -0.25 -8 10 -0.25 -9 5 -0.25 -14 4 -0.25 -11.75
  [4,14,7.75,-0.25,-8,10,-0.25,-9,5,-0.25,-14,4,-0.25,-11.75],
// 4 14 10 -0.25 -9 7.75 -0.25 -8 7.75 -0.25 0 10 -0.25 1
  [4,14,10,-0.25,-9,7.75,-0.25,-8,7.75,-0.25,0,10,-0.25,1],
// 4 14 5 -0.25 2.75 6 -0.25 5 10 -0.25 1 7.75 -0.25 0
  [4,14,5,-0.25,2.75,6,-0.25,5,10,-0.25,1,7.75,-0.25,0],
// 4 14 6 -0.25 5 5 -0.25 2.75 -3.25 -0.25 2.75 -1 -0.25 5
  [4,14,6,-0.25,5,5,-0.25,2.75,-3.25,-0.25,2.75,-1,-0.25,5],
// 4 14 -3.25 -0.25 9.25 -1 -0.25 7 -1 -0.25 5 -3.25 -0.25 2.75
  [4,14,-3.25,-0.25,9.25,-1,-0.25,7,-1,-0.25,5,-3.25,-0.25,2.75],
// 4 14 -1 -0.25 7 -3.25 -0.25 9.25 6.75 -0.25 9.25 9 -0.25 7
  [4,14,-1,-0.25,7,-3.25,-0.25,9.25,6.75,-0.25,9.25,9,-0.25,7],
// 4 14 9 -0.25 7 6.75 -0.25 9.25 6.75 -0.25 11.75 9 -0.25 14
  [4,14,9,-0.25,7,6.75,-0.25,9.25,6.75,-0.25,11.75,9,-0.25,14],
// 0 // Transparent background
// 4 16 6.75 -0.25 11.75 6.75 -0.25 9.25 -3.25 -0.25 9.25 -6.75 -0.25 11.75
  [4,16,6.75,-0.25,11.75,6.75,-0.25,9.25,-3.25,-0.25,9.25,-6.75,-0.25,11.75],
// 4 16 -3.25 -0.25 2.75 -6.75 -0.25 0.25 -6.75 -0.25 11.75 -3.25 -0.25 9.25
  [4,16,-3.25,-0.25,2.75,-6.75,-0.25,0.25,-6.75,-0.25,11.75,-3.25,-0.25,9.25],
// 4 16 -6.75 -0.25 0.25 -3.25 -0.25 2.75 5 -0.25 2.75 3 -0.25 0.25
  [4,16,-6.75,-0.25,0.25,-3.25,-0.25,2.75,5,-0.25,2.75,3,-0.25,0.25],
// 4 16 7.75 -0.25 0 4.25 -0.25 -1 3 -0.25 0.25 5 -0.25 2.75
  [4,16,7.75,-0.25,0,4.25,-0.25,-1,3,-0.25,0.25,5,-0.25,2.75],
// 4 16 4.25 -0.25 -1 7.75 -0.25 0 7.75 -0.25 -8 4.25 -0.25 -8
  [4,16,4.25,-0.25,-1,7.75,-0.25,0,7.75,-0.25,-8,4.25,-0.25,-8],
// 4 16 4 -0.25 -11.75 3 -0.25 -9.25 4.25 -0.25 -8 7.75 -0.25 -8
  [4,16,4,-0.25,-11.75,3,-0.25,-9.25,4.25,-0.25,-8,7.75,-0.25,-8],
// 4 16 3 -0.25 -9.25 4 -0.25 -11.75 -4 -0.25 -11.75 -3 -0.25 -9.25
  [4,16,3,-0.25,-9.25,4,-0.25,-11.75,-4,-0.25,-11.75,-3,-0.25,-9.25],
// 4 16 -7.75 -0.25 -8 -4.25 -0.25 -8 -3 -0.25 -9.25 -4 -0.25 -11.75
  [4,16,-7.75,-0.25,-8,-4.25,-0.25,-8,-3,-0.25,-9.25,-4,-0.25,-11.75],
// 4 16 -4.25 -0.25 -8 -7.75 -0.25 -8 -7.75 -0.25 -5.25 -4.25 -0.25 -5.25
  [4,16,-4.25,-0.25,-8,-7.75,-0.25,-8,-7.75,-0.25,-5.25,-4.25,-0.25,-5.25],
// 
// 4 16 2 -0.25 -7 -2 -0.25 -7 -2 -0.25 -3 2 -0.25 -2
  [4,16,2,-0.25,-7,-2,-0.25,-7,-2,-0.25,-3,2,-0.25,-2],
// 4 16 2 -0.25 -2 -2 -0.25 -3 -10 -0.25 -3 -9 -0.25 -2
  [4,16,2,-0.25,-2,-2,-0.25,-3,-10,-0.25,-3,-9,-0.25,-2],
// 4 16 -12 -0.25 18 -9 -0.25 14 -9 -0.25 -2 -10 -0.25 -3
  [4,16,-12,-0.25,18,-9,-0.25,14,-9,-0.25,-2,-10,-0.25,-3],
// 4 16 12 -0.25 18 9 -0.25 14 -9 -0.25 14 -12 -0.25 18
  [4,16,12,-0.25,18,9,-0.25,14,-9,-0.25,14,-12,-0.25,18],
// 4 16 9 -0.25 14 12 -0.25 18 10 -0.25 1 9 -0.25 7
  [4,16,9,-0.25,14,12,-0.25,18,10,-0.25,1,9,-0.25,7],
// 3 16 6 -0.25 5 9 -0.25 7 10 -0.25 1
  [3,16,6,-0.25,5,9,-0.25,7,10,-0.25,1],
// 4 16 9 -0.25 7 6 -0.25 5 -1 -0.25 5 -1 -0.25 7
  [4,16,9,-0.25,7,6,-0.25,5,-1,-0.25,5,-1,-0.25,7],
// 4 16 12 -0.25 -18 10 -0.25 -9 10 -0.25 1 12 -0.25 18
  [4,16,12,-0.25,-18,10,-0.25,-9,10,-0.25,1,12,-0.25,18],
// 3 16 10 -0.25 -9 12 -0.25 -18 5 -0.25 -14
  [3,16,10,-0.25,-9,12,-0.25,-18,5,-0.25,-14],
// 4 16 -12 -0.25 -18 -5 -0.25 -14 5 -0.25 -14 12 -0.25 -18
  [4,16,-12,-0.25,-18,-5,-0.25,-14,5,-0.25,-14,12,-0.25,-18],
// 3 16 -5 -0.25 -14 -12 -0.25 -18 -10 -0.25 -9
  [3,16,-5,-0.25,-14,-12,-0.25,-18,-10,-0.25,-9],
// 4 16 -12 -0.25 18 -10 -0.25 -3 -10 -0.25 -9 -12 -0.25 -18
  [4,16,-12,-0.25,18,-10,-0.25,-3,-10,-0.25,-9,-12,-0.25,-18],
// 0 // Thin box
// 1 16 0 -0.25 0 12 0 0 0 0.25 0 0 0 18 box5-12.dat
  [1,16,0,-0.25,0,12,0,0,0,0.25,0,0,0,18, ldraw_lib__box5_12(realsolid)],
// 0
];
module ldraw_lib__820675a(step=0, col=false, unit=2/5, alt=false, line=0.2, solid=!$preview)
    makepoly(ldraw_lib__820675a(solid), step=step, col=col, unit=unit, alt=alt, line=line, solid=solid);
ldraw_lib__820675a(line=0.2);
